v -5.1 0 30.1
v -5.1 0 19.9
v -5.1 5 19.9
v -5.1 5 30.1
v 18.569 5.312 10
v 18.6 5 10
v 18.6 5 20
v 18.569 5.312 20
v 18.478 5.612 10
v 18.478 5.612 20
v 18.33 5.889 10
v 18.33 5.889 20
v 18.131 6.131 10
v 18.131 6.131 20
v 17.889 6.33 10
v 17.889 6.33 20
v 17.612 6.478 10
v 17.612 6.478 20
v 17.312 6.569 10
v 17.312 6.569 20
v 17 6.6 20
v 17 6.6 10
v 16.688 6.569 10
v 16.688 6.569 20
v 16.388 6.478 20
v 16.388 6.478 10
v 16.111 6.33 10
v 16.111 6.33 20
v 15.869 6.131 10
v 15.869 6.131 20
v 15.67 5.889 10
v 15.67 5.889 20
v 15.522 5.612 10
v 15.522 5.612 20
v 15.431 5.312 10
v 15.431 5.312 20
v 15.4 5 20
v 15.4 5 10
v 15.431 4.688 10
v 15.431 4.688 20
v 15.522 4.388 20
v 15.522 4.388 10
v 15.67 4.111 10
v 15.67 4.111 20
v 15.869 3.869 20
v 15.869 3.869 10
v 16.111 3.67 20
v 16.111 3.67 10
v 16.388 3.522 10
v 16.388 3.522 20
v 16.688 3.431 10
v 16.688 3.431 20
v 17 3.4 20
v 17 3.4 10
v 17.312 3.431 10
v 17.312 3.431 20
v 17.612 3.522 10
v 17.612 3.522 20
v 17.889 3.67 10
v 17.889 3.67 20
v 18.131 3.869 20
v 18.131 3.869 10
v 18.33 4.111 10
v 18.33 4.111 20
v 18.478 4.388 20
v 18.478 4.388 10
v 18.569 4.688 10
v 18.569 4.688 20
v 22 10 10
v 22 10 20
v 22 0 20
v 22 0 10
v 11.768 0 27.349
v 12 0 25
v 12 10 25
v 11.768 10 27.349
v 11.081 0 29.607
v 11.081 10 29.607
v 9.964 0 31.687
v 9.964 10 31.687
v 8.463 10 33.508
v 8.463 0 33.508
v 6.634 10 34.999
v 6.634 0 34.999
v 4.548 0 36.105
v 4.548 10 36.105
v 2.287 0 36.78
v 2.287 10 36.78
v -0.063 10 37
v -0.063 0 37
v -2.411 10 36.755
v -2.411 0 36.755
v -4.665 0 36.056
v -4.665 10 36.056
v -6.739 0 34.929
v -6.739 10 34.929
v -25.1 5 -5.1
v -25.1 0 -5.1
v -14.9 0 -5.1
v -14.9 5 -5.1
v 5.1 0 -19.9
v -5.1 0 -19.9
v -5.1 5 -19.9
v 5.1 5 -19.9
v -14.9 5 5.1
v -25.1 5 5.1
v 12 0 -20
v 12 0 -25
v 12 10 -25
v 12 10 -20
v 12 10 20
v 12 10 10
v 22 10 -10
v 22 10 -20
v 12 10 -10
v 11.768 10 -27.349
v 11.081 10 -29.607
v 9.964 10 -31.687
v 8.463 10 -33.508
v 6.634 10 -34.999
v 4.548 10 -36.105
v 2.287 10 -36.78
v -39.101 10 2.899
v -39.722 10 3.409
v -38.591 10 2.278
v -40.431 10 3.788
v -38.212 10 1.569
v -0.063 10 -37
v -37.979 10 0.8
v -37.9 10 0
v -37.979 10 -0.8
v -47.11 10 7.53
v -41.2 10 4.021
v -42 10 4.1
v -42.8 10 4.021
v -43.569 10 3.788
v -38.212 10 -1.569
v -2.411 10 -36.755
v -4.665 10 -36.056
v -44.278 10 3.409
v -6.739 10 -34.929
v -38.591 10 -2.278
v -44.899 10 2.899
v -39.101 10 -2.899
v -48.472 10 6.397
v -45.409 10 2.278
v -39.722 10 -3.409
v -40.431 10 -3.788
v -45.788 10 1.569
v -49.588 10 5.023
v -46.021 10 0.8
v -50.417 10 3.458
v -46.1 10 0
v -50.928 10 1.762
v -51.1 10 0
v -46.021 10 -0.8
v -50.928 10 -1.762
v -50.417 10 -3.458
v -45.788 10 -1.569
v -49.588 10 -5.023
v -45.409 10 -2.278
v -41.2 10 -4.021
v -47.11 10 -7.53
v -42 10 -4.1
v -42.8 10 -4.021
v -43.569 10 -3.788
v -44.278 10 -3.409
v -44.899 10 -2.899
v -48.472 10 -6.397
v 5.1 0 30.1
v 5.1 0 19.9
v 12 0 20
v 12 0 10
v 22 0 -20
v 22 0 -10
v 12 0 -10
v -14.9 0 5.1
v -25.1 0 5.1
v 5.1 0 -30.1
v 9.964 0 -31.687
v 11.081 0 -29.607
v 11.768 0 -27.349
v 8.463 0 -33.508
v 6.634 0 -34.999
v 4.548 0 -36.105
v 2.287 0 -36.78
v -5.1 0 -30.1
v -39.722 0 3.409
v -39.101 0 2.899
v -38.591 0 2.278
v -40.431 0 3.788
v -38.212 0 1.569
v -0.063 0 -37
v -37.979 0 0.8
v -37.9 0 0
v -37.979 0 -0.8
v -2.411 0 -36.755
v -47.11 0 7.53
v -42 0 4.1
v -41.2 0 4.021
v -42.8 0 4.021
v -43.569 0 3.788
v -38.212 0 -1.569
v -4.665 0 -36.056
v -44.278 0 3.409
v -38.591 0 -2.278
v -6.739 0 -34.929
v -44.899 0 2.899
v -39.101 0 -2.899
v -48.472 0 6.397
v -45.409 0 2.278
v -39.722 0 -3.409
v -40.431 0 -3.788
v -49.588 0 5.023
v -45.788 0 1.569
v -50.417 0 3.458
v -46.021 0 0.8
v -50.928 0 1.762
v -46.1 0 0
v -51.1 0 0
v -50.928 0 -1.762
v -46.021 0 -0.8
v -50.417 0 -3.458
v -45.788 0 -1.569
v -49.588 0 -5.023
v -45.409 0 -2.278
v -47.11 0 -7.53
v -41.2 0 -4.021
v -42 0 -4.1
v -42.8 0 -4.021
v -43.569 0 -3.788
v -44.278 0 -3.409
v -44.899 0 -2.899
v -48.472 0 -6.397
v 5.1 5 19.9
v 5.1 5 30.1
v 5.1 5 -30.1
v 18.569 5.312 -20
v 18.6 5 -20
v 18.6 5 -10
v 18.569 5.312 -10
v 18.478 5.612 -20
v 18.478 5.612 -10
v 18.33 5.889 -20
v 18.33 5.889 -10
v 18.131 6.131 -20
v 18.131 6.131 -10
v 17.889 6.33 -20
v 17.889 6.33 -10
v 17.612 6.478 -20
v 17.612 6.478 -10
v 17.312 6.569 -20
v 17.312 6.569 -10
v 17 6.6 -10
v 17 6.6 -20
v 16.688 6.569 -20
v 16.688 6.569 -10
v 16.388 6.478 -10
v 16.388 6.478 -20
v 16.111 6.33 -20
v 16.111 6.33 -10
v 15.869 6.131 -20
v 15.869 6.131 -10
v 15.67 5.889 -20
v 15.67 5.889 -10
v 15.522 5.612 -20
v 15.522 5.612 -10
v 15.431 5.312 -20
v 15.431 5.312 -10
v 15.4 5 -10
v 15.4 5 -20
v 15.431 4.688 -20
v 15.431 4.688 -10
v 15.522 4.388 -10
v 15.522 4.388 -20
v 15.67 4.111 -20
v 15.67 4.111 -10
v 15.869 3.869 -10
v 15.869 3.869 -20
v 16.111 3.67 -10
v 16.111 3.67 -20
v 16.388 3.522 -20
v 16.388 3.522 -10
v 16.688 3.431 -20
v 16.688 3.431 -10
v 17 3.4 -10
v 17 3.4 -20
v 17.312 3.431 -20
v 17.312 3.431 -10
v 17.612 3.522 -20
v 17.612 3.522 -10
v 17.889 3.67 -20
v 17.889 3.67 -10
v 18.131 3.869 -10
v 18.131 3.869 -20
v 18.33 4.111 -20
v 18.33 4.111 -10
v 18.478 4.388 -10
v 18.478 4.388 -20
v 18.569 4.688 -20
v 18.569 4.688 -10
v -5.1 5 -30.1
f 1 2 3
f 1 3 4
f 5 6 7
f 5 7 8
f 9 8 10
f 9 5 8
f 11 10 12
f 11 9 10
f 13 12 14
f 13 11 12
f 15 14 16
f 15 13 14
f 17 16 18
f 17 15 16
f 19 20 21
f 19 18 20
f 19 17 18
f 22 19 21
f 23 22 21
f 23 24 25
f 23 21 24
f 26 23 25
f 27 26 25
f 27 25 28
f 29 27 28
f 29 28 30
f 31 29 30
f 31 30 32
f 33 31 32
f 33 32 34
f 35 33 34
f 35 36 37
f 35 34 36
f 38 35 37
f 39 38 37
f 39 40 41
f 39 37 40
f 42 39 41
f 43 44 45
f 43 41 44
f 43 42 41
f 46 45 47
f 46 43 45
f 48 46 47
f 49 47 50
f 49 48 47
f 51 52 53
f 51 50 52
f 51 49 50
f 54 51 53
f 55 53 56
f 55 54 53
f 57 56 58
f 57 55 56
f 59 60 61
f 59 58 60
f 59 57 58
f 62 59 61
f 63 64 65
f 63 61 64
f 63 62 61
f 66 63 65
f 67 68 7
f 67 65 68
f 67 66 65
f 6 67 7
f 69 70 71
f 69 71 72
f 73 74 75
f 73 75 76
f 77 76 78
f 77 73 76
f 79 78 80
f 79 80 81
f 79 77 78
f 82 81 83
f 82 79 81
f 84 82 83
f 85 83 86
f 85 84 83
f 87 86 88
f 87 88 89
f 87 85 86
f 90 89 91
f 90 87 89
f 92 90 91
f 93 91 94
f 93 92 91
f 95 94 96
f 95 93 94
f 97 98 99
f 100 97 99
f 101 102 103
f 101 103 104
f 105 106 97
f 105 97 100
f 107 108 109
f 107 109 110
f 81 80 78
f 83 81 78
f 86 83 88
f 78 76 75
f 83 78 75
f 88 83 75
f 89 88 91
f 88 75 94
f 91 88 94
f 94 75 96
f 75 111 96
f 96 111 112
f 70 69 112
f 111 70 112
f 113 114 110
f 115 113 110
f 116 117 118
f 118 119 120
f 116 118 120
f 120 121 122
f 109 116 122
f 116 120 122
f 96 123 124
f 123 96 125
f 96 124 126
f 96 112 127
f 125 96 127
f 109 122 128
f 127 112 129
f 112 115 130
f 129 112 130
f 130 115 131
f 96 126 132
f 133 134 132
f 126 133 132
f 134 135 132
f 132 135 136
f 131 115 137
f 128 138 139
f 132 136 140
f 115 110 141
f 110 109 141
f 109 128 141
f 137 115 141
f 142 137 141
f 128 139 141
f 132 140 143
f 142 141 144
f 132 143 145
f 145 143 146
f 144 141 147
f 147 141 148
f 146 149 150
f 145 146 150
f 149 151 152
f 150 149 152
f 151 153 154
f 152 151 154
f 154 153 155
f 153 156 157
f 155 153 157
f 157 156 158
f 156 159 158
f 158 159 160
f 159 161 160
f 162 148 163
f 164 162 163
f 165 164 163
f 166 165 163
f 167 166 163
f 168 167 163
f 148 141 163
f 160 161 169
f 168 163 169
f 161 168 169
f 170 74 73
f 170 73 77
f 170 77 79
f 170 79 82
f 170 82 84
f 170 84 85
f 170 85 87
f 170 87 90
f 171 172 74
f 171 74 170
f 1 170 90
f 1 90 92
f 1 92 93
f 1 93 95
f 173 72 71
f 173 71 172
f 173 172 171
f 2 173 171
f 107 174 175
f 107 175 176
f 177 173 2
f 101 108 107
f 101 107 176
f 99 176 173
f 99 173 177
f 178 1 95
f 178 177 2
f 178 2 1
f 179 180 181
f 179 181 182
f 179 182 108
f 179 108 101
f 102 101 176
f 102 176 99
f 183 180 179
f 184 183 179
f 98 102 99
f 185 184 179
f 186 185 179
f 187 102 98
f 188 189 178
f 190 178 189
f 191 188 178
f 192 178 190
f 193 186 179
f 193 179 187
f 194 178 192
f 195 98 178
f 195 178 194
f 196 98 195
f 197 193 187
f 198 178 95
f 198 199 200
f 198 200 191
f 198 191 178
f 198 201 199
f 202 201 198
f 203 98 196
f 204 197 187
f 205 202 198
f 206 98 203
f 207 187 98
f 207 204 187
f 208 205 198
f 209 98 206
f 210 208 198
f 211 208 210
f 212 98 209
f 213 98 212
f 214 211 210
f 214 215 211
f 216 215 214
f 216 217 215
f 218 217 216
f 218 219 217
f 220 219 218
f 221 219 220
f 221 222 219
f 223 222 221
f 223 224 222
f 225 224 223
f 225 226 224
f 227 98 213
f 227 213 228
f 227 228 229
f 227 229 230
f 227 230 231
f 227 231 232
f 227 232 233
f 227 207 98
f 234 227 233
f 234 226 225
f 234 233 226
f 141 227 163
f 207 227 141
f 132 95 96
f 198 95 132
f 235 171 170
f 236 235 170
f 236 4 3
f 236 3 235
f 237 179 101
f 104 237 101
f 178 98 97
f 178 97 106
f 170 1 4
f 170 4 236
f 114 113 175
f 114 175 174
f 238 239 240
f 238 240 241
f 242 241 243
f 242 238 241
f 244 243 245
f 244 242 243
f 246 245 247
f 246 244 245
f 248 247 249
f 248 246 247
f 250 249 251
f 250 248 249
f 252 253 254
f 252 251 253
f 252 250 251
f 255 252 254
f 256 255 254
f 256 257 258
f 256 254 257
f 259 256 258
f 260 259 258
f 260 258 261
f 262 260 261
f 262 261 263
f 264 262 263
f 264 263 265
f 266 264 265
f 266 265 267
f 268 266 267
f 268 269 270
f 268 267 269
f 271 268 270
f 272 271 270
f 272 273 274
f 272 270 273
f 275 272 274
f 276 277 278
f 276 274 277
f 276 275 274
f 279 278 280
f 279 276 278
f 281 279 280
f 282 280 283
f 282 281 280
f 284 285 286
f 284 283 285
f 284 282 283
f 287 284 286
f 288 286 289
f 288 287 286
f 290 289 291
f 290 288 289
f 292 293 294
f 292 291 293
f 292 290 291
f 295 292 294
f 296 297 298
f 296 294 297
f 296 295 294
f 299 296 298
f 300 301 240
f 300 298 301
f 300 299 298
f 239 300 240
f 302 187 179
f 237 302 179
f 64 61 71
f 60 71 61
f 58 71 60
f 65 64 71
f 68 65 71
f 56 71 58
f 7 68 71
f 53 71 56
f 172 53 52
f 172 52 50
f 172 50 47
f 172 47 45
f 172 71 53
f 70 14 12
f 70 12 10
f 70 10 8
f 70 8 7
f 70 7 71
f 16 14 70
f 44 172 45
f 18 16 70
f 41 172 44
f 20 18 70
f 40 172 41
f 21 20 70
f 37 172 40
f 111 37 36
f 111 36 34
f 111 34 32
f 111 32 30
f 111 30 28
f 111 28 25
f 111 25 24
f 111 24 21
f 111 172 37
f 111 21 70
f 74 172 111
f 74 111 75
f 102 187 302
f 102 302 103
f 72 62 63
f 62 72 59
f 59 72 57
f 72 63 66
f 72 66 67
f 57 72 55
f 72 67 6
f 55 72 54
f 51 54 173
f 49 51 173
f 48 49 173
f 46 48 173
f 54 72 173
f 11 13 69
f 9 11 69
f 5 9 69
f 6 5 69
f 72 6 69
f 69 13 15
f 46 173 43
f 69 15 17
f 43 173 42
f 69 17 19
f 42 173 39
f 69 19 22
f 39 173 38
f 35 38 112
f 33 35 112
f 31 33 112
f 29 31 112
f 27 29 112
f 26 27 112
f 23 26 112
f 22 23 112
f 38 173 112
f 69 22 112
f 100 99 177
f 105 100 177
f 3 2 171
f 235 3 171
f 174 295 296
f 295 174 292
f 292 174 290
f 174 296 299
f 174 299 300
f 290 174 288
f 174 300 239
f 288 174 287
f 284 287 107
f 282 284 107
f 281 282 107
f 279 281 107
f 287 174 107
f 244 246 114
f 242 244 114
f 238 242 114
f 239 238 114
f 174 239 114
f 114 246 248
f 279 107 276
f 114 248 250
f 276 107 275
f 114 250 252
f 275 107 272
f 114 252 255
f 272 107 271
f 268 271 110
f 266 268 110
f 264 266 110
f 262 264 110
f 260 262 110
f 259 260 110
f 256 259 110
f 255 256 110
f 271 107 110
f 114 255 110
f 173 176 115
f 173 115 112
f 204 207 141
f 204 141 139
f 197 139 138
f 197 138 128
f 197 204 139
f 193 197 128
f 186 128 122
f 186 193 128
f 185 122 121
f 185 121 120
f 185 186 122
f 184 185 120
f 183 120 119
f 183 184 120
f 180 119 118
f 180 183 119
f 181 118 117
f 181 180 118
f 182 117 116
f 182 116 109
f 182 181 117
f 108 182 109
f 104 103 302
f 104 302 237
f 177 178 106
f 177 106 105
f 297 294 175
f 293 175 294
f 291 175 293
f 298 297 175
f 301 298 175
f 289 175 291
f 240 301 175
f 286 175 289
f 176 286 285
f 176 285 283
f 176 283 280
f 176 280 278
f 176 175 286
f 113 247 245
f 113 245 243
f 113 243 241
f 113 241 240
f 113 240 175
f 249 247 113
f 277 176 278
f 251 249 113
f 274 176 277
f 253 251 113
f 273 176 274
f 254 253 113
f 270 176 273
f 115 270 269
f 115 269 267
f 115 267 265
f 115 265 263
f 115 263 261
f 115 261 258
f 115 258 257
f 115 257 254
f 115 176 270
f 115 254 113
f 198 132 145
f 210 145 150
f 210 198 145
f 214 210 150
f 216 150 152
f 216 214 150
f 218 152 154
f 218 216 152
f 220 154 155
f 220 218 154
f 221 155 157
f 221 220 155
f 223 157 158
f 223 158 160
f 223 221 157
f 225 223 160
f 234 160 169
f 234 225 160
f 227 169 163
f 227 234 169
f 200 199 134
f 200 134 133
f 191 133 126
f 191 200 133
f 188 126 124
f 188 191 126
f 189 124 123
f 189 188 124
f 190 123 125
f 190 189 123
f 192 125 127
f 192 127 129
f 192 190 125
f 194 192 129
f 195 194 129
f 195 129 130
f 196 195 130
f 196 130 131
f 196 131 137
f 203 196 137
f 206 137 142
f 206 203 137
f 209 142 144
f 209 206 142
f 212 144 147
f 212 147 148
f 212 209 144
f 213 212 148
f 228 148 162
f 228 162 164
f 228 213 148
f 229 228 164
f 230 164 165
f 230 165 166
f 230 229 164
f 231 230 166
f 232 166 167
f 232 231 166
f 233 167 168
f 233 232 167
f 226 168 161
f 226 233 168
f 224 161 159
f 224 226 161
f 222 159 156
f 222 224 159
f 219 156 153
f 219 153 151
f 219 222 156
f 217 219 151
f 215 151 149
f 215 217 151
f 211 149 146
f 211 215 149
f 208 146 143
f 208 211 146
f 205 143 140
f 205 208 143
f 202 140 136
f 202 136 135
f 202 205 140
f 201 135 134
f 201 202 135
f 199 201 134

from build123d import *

# Parameters (mm, degrees)
SKETCH_1_R               = 4.1
EXTRUDE_1_DEPTH          = 10
SKETCH_2_W               = 10.2
SKETCH_2_H               = 10.2
CUT_EXTRUDE_1_DEPTH      = 5
SKETCH_3_W               = 10
SKETCH_3_H               = 10
EXTRUDE_2_DEPTH          = 10
CUT_EXTRUDE_2_DEPTH      = 64.876521508
CUT_EXTRUDE_2_DEPTH_BACK = 64.876521508
SKETCH_4_R               = 1.6


with BuildPart() as part:
    # ｽｹｯﾁ1 → ﾎﾞｽ - 押し出し1 (new body)
    with BuildSketch(Plane(origin=(0, 0, 0), x_dir=(1, 0, 0), z_dir=(0, 1, 0))):
        with BuildLine():
            Line((-47.110254718, 7.529627927), (-6.738797431, 34.929179684))
            ThreePointArc((-6.738797431, 34.929179684), (5.618470914, 35.603432679), (12, 25))
            Line((12, 25), (12, -25))
            ThreePointArc((12, -25), (5.618470914, -35.603432679), (-6.738797431, -34.929179684))
            Line((-6.738797431, -34.929179684), (-47.110254718, -7.529627927))
            ThreePointArc((-47.110254718, -7.529627927), (-51.1, 0), (-47.110254718, 7.529627927))
        make_face()
        with Locations(Location((-42, 0, 0), (0, 0, 270))):
            Circle(SKETCH_1_R, mode=Mode.SUBTRACT)
    extrude(amount=EXTRUDE_1_DEPTH)

    # ｽｹｯﾁ2 → ｶｯﾄ - 押し出し1 (cut)
    with BuildSketch(Plane.XZ):
        with Locations((0, 25)):
            Rectangle(SKETCH_2_W, SKETCH_2_H)
        with Locations((0, -25)):
            Rectangle(SKETCH_2_W, SKETCH_2_H)
        with Locations((-20, 0)):
            Rectangle(SKETCH_2_W, SKETCH_2_H)
    extrude(amount=-CUT_EXTRUDE_1_DEPTH, mode=Mode.SUBTRACT)

    # ｽｹｯﾁ3 → ﾎﾞｽ - 押し出し2 (add)
    with BuildSketch(Plane(origin=(12, 0, 0), x_dir=(0, 0, -1), z_dir=(1, 0, 0))):
        with Locations((-15, 5)):
            Rectangle(SKETCH_3_W, SKETCH_3_H)
        with Locations((15, 5)):
            Rectangle(SKETCH_3_W, SKETCH_3_H)
    extrude(amount=EXTRUDE_2_DEPTH)

    # ｽｹｯﾁ4 → ｶｯﾄ - 押し出し2 (cut, two sides: drawn at the far end of the back side and taken through both)
    with BuildSketch(Plane.XY.offset(-CUT_EXTRUDE_2_DEPTH_BACK)):
        with Locations((17, 5)):
            Circle(SKETCH_4_R)
    extrude(amount=CUT_EXTRUDE_2_DEPTH + CUT_EXTRUDE_2_DEPTH_BACK, mode=Mode.SUBTRACT)


solid = part.part
